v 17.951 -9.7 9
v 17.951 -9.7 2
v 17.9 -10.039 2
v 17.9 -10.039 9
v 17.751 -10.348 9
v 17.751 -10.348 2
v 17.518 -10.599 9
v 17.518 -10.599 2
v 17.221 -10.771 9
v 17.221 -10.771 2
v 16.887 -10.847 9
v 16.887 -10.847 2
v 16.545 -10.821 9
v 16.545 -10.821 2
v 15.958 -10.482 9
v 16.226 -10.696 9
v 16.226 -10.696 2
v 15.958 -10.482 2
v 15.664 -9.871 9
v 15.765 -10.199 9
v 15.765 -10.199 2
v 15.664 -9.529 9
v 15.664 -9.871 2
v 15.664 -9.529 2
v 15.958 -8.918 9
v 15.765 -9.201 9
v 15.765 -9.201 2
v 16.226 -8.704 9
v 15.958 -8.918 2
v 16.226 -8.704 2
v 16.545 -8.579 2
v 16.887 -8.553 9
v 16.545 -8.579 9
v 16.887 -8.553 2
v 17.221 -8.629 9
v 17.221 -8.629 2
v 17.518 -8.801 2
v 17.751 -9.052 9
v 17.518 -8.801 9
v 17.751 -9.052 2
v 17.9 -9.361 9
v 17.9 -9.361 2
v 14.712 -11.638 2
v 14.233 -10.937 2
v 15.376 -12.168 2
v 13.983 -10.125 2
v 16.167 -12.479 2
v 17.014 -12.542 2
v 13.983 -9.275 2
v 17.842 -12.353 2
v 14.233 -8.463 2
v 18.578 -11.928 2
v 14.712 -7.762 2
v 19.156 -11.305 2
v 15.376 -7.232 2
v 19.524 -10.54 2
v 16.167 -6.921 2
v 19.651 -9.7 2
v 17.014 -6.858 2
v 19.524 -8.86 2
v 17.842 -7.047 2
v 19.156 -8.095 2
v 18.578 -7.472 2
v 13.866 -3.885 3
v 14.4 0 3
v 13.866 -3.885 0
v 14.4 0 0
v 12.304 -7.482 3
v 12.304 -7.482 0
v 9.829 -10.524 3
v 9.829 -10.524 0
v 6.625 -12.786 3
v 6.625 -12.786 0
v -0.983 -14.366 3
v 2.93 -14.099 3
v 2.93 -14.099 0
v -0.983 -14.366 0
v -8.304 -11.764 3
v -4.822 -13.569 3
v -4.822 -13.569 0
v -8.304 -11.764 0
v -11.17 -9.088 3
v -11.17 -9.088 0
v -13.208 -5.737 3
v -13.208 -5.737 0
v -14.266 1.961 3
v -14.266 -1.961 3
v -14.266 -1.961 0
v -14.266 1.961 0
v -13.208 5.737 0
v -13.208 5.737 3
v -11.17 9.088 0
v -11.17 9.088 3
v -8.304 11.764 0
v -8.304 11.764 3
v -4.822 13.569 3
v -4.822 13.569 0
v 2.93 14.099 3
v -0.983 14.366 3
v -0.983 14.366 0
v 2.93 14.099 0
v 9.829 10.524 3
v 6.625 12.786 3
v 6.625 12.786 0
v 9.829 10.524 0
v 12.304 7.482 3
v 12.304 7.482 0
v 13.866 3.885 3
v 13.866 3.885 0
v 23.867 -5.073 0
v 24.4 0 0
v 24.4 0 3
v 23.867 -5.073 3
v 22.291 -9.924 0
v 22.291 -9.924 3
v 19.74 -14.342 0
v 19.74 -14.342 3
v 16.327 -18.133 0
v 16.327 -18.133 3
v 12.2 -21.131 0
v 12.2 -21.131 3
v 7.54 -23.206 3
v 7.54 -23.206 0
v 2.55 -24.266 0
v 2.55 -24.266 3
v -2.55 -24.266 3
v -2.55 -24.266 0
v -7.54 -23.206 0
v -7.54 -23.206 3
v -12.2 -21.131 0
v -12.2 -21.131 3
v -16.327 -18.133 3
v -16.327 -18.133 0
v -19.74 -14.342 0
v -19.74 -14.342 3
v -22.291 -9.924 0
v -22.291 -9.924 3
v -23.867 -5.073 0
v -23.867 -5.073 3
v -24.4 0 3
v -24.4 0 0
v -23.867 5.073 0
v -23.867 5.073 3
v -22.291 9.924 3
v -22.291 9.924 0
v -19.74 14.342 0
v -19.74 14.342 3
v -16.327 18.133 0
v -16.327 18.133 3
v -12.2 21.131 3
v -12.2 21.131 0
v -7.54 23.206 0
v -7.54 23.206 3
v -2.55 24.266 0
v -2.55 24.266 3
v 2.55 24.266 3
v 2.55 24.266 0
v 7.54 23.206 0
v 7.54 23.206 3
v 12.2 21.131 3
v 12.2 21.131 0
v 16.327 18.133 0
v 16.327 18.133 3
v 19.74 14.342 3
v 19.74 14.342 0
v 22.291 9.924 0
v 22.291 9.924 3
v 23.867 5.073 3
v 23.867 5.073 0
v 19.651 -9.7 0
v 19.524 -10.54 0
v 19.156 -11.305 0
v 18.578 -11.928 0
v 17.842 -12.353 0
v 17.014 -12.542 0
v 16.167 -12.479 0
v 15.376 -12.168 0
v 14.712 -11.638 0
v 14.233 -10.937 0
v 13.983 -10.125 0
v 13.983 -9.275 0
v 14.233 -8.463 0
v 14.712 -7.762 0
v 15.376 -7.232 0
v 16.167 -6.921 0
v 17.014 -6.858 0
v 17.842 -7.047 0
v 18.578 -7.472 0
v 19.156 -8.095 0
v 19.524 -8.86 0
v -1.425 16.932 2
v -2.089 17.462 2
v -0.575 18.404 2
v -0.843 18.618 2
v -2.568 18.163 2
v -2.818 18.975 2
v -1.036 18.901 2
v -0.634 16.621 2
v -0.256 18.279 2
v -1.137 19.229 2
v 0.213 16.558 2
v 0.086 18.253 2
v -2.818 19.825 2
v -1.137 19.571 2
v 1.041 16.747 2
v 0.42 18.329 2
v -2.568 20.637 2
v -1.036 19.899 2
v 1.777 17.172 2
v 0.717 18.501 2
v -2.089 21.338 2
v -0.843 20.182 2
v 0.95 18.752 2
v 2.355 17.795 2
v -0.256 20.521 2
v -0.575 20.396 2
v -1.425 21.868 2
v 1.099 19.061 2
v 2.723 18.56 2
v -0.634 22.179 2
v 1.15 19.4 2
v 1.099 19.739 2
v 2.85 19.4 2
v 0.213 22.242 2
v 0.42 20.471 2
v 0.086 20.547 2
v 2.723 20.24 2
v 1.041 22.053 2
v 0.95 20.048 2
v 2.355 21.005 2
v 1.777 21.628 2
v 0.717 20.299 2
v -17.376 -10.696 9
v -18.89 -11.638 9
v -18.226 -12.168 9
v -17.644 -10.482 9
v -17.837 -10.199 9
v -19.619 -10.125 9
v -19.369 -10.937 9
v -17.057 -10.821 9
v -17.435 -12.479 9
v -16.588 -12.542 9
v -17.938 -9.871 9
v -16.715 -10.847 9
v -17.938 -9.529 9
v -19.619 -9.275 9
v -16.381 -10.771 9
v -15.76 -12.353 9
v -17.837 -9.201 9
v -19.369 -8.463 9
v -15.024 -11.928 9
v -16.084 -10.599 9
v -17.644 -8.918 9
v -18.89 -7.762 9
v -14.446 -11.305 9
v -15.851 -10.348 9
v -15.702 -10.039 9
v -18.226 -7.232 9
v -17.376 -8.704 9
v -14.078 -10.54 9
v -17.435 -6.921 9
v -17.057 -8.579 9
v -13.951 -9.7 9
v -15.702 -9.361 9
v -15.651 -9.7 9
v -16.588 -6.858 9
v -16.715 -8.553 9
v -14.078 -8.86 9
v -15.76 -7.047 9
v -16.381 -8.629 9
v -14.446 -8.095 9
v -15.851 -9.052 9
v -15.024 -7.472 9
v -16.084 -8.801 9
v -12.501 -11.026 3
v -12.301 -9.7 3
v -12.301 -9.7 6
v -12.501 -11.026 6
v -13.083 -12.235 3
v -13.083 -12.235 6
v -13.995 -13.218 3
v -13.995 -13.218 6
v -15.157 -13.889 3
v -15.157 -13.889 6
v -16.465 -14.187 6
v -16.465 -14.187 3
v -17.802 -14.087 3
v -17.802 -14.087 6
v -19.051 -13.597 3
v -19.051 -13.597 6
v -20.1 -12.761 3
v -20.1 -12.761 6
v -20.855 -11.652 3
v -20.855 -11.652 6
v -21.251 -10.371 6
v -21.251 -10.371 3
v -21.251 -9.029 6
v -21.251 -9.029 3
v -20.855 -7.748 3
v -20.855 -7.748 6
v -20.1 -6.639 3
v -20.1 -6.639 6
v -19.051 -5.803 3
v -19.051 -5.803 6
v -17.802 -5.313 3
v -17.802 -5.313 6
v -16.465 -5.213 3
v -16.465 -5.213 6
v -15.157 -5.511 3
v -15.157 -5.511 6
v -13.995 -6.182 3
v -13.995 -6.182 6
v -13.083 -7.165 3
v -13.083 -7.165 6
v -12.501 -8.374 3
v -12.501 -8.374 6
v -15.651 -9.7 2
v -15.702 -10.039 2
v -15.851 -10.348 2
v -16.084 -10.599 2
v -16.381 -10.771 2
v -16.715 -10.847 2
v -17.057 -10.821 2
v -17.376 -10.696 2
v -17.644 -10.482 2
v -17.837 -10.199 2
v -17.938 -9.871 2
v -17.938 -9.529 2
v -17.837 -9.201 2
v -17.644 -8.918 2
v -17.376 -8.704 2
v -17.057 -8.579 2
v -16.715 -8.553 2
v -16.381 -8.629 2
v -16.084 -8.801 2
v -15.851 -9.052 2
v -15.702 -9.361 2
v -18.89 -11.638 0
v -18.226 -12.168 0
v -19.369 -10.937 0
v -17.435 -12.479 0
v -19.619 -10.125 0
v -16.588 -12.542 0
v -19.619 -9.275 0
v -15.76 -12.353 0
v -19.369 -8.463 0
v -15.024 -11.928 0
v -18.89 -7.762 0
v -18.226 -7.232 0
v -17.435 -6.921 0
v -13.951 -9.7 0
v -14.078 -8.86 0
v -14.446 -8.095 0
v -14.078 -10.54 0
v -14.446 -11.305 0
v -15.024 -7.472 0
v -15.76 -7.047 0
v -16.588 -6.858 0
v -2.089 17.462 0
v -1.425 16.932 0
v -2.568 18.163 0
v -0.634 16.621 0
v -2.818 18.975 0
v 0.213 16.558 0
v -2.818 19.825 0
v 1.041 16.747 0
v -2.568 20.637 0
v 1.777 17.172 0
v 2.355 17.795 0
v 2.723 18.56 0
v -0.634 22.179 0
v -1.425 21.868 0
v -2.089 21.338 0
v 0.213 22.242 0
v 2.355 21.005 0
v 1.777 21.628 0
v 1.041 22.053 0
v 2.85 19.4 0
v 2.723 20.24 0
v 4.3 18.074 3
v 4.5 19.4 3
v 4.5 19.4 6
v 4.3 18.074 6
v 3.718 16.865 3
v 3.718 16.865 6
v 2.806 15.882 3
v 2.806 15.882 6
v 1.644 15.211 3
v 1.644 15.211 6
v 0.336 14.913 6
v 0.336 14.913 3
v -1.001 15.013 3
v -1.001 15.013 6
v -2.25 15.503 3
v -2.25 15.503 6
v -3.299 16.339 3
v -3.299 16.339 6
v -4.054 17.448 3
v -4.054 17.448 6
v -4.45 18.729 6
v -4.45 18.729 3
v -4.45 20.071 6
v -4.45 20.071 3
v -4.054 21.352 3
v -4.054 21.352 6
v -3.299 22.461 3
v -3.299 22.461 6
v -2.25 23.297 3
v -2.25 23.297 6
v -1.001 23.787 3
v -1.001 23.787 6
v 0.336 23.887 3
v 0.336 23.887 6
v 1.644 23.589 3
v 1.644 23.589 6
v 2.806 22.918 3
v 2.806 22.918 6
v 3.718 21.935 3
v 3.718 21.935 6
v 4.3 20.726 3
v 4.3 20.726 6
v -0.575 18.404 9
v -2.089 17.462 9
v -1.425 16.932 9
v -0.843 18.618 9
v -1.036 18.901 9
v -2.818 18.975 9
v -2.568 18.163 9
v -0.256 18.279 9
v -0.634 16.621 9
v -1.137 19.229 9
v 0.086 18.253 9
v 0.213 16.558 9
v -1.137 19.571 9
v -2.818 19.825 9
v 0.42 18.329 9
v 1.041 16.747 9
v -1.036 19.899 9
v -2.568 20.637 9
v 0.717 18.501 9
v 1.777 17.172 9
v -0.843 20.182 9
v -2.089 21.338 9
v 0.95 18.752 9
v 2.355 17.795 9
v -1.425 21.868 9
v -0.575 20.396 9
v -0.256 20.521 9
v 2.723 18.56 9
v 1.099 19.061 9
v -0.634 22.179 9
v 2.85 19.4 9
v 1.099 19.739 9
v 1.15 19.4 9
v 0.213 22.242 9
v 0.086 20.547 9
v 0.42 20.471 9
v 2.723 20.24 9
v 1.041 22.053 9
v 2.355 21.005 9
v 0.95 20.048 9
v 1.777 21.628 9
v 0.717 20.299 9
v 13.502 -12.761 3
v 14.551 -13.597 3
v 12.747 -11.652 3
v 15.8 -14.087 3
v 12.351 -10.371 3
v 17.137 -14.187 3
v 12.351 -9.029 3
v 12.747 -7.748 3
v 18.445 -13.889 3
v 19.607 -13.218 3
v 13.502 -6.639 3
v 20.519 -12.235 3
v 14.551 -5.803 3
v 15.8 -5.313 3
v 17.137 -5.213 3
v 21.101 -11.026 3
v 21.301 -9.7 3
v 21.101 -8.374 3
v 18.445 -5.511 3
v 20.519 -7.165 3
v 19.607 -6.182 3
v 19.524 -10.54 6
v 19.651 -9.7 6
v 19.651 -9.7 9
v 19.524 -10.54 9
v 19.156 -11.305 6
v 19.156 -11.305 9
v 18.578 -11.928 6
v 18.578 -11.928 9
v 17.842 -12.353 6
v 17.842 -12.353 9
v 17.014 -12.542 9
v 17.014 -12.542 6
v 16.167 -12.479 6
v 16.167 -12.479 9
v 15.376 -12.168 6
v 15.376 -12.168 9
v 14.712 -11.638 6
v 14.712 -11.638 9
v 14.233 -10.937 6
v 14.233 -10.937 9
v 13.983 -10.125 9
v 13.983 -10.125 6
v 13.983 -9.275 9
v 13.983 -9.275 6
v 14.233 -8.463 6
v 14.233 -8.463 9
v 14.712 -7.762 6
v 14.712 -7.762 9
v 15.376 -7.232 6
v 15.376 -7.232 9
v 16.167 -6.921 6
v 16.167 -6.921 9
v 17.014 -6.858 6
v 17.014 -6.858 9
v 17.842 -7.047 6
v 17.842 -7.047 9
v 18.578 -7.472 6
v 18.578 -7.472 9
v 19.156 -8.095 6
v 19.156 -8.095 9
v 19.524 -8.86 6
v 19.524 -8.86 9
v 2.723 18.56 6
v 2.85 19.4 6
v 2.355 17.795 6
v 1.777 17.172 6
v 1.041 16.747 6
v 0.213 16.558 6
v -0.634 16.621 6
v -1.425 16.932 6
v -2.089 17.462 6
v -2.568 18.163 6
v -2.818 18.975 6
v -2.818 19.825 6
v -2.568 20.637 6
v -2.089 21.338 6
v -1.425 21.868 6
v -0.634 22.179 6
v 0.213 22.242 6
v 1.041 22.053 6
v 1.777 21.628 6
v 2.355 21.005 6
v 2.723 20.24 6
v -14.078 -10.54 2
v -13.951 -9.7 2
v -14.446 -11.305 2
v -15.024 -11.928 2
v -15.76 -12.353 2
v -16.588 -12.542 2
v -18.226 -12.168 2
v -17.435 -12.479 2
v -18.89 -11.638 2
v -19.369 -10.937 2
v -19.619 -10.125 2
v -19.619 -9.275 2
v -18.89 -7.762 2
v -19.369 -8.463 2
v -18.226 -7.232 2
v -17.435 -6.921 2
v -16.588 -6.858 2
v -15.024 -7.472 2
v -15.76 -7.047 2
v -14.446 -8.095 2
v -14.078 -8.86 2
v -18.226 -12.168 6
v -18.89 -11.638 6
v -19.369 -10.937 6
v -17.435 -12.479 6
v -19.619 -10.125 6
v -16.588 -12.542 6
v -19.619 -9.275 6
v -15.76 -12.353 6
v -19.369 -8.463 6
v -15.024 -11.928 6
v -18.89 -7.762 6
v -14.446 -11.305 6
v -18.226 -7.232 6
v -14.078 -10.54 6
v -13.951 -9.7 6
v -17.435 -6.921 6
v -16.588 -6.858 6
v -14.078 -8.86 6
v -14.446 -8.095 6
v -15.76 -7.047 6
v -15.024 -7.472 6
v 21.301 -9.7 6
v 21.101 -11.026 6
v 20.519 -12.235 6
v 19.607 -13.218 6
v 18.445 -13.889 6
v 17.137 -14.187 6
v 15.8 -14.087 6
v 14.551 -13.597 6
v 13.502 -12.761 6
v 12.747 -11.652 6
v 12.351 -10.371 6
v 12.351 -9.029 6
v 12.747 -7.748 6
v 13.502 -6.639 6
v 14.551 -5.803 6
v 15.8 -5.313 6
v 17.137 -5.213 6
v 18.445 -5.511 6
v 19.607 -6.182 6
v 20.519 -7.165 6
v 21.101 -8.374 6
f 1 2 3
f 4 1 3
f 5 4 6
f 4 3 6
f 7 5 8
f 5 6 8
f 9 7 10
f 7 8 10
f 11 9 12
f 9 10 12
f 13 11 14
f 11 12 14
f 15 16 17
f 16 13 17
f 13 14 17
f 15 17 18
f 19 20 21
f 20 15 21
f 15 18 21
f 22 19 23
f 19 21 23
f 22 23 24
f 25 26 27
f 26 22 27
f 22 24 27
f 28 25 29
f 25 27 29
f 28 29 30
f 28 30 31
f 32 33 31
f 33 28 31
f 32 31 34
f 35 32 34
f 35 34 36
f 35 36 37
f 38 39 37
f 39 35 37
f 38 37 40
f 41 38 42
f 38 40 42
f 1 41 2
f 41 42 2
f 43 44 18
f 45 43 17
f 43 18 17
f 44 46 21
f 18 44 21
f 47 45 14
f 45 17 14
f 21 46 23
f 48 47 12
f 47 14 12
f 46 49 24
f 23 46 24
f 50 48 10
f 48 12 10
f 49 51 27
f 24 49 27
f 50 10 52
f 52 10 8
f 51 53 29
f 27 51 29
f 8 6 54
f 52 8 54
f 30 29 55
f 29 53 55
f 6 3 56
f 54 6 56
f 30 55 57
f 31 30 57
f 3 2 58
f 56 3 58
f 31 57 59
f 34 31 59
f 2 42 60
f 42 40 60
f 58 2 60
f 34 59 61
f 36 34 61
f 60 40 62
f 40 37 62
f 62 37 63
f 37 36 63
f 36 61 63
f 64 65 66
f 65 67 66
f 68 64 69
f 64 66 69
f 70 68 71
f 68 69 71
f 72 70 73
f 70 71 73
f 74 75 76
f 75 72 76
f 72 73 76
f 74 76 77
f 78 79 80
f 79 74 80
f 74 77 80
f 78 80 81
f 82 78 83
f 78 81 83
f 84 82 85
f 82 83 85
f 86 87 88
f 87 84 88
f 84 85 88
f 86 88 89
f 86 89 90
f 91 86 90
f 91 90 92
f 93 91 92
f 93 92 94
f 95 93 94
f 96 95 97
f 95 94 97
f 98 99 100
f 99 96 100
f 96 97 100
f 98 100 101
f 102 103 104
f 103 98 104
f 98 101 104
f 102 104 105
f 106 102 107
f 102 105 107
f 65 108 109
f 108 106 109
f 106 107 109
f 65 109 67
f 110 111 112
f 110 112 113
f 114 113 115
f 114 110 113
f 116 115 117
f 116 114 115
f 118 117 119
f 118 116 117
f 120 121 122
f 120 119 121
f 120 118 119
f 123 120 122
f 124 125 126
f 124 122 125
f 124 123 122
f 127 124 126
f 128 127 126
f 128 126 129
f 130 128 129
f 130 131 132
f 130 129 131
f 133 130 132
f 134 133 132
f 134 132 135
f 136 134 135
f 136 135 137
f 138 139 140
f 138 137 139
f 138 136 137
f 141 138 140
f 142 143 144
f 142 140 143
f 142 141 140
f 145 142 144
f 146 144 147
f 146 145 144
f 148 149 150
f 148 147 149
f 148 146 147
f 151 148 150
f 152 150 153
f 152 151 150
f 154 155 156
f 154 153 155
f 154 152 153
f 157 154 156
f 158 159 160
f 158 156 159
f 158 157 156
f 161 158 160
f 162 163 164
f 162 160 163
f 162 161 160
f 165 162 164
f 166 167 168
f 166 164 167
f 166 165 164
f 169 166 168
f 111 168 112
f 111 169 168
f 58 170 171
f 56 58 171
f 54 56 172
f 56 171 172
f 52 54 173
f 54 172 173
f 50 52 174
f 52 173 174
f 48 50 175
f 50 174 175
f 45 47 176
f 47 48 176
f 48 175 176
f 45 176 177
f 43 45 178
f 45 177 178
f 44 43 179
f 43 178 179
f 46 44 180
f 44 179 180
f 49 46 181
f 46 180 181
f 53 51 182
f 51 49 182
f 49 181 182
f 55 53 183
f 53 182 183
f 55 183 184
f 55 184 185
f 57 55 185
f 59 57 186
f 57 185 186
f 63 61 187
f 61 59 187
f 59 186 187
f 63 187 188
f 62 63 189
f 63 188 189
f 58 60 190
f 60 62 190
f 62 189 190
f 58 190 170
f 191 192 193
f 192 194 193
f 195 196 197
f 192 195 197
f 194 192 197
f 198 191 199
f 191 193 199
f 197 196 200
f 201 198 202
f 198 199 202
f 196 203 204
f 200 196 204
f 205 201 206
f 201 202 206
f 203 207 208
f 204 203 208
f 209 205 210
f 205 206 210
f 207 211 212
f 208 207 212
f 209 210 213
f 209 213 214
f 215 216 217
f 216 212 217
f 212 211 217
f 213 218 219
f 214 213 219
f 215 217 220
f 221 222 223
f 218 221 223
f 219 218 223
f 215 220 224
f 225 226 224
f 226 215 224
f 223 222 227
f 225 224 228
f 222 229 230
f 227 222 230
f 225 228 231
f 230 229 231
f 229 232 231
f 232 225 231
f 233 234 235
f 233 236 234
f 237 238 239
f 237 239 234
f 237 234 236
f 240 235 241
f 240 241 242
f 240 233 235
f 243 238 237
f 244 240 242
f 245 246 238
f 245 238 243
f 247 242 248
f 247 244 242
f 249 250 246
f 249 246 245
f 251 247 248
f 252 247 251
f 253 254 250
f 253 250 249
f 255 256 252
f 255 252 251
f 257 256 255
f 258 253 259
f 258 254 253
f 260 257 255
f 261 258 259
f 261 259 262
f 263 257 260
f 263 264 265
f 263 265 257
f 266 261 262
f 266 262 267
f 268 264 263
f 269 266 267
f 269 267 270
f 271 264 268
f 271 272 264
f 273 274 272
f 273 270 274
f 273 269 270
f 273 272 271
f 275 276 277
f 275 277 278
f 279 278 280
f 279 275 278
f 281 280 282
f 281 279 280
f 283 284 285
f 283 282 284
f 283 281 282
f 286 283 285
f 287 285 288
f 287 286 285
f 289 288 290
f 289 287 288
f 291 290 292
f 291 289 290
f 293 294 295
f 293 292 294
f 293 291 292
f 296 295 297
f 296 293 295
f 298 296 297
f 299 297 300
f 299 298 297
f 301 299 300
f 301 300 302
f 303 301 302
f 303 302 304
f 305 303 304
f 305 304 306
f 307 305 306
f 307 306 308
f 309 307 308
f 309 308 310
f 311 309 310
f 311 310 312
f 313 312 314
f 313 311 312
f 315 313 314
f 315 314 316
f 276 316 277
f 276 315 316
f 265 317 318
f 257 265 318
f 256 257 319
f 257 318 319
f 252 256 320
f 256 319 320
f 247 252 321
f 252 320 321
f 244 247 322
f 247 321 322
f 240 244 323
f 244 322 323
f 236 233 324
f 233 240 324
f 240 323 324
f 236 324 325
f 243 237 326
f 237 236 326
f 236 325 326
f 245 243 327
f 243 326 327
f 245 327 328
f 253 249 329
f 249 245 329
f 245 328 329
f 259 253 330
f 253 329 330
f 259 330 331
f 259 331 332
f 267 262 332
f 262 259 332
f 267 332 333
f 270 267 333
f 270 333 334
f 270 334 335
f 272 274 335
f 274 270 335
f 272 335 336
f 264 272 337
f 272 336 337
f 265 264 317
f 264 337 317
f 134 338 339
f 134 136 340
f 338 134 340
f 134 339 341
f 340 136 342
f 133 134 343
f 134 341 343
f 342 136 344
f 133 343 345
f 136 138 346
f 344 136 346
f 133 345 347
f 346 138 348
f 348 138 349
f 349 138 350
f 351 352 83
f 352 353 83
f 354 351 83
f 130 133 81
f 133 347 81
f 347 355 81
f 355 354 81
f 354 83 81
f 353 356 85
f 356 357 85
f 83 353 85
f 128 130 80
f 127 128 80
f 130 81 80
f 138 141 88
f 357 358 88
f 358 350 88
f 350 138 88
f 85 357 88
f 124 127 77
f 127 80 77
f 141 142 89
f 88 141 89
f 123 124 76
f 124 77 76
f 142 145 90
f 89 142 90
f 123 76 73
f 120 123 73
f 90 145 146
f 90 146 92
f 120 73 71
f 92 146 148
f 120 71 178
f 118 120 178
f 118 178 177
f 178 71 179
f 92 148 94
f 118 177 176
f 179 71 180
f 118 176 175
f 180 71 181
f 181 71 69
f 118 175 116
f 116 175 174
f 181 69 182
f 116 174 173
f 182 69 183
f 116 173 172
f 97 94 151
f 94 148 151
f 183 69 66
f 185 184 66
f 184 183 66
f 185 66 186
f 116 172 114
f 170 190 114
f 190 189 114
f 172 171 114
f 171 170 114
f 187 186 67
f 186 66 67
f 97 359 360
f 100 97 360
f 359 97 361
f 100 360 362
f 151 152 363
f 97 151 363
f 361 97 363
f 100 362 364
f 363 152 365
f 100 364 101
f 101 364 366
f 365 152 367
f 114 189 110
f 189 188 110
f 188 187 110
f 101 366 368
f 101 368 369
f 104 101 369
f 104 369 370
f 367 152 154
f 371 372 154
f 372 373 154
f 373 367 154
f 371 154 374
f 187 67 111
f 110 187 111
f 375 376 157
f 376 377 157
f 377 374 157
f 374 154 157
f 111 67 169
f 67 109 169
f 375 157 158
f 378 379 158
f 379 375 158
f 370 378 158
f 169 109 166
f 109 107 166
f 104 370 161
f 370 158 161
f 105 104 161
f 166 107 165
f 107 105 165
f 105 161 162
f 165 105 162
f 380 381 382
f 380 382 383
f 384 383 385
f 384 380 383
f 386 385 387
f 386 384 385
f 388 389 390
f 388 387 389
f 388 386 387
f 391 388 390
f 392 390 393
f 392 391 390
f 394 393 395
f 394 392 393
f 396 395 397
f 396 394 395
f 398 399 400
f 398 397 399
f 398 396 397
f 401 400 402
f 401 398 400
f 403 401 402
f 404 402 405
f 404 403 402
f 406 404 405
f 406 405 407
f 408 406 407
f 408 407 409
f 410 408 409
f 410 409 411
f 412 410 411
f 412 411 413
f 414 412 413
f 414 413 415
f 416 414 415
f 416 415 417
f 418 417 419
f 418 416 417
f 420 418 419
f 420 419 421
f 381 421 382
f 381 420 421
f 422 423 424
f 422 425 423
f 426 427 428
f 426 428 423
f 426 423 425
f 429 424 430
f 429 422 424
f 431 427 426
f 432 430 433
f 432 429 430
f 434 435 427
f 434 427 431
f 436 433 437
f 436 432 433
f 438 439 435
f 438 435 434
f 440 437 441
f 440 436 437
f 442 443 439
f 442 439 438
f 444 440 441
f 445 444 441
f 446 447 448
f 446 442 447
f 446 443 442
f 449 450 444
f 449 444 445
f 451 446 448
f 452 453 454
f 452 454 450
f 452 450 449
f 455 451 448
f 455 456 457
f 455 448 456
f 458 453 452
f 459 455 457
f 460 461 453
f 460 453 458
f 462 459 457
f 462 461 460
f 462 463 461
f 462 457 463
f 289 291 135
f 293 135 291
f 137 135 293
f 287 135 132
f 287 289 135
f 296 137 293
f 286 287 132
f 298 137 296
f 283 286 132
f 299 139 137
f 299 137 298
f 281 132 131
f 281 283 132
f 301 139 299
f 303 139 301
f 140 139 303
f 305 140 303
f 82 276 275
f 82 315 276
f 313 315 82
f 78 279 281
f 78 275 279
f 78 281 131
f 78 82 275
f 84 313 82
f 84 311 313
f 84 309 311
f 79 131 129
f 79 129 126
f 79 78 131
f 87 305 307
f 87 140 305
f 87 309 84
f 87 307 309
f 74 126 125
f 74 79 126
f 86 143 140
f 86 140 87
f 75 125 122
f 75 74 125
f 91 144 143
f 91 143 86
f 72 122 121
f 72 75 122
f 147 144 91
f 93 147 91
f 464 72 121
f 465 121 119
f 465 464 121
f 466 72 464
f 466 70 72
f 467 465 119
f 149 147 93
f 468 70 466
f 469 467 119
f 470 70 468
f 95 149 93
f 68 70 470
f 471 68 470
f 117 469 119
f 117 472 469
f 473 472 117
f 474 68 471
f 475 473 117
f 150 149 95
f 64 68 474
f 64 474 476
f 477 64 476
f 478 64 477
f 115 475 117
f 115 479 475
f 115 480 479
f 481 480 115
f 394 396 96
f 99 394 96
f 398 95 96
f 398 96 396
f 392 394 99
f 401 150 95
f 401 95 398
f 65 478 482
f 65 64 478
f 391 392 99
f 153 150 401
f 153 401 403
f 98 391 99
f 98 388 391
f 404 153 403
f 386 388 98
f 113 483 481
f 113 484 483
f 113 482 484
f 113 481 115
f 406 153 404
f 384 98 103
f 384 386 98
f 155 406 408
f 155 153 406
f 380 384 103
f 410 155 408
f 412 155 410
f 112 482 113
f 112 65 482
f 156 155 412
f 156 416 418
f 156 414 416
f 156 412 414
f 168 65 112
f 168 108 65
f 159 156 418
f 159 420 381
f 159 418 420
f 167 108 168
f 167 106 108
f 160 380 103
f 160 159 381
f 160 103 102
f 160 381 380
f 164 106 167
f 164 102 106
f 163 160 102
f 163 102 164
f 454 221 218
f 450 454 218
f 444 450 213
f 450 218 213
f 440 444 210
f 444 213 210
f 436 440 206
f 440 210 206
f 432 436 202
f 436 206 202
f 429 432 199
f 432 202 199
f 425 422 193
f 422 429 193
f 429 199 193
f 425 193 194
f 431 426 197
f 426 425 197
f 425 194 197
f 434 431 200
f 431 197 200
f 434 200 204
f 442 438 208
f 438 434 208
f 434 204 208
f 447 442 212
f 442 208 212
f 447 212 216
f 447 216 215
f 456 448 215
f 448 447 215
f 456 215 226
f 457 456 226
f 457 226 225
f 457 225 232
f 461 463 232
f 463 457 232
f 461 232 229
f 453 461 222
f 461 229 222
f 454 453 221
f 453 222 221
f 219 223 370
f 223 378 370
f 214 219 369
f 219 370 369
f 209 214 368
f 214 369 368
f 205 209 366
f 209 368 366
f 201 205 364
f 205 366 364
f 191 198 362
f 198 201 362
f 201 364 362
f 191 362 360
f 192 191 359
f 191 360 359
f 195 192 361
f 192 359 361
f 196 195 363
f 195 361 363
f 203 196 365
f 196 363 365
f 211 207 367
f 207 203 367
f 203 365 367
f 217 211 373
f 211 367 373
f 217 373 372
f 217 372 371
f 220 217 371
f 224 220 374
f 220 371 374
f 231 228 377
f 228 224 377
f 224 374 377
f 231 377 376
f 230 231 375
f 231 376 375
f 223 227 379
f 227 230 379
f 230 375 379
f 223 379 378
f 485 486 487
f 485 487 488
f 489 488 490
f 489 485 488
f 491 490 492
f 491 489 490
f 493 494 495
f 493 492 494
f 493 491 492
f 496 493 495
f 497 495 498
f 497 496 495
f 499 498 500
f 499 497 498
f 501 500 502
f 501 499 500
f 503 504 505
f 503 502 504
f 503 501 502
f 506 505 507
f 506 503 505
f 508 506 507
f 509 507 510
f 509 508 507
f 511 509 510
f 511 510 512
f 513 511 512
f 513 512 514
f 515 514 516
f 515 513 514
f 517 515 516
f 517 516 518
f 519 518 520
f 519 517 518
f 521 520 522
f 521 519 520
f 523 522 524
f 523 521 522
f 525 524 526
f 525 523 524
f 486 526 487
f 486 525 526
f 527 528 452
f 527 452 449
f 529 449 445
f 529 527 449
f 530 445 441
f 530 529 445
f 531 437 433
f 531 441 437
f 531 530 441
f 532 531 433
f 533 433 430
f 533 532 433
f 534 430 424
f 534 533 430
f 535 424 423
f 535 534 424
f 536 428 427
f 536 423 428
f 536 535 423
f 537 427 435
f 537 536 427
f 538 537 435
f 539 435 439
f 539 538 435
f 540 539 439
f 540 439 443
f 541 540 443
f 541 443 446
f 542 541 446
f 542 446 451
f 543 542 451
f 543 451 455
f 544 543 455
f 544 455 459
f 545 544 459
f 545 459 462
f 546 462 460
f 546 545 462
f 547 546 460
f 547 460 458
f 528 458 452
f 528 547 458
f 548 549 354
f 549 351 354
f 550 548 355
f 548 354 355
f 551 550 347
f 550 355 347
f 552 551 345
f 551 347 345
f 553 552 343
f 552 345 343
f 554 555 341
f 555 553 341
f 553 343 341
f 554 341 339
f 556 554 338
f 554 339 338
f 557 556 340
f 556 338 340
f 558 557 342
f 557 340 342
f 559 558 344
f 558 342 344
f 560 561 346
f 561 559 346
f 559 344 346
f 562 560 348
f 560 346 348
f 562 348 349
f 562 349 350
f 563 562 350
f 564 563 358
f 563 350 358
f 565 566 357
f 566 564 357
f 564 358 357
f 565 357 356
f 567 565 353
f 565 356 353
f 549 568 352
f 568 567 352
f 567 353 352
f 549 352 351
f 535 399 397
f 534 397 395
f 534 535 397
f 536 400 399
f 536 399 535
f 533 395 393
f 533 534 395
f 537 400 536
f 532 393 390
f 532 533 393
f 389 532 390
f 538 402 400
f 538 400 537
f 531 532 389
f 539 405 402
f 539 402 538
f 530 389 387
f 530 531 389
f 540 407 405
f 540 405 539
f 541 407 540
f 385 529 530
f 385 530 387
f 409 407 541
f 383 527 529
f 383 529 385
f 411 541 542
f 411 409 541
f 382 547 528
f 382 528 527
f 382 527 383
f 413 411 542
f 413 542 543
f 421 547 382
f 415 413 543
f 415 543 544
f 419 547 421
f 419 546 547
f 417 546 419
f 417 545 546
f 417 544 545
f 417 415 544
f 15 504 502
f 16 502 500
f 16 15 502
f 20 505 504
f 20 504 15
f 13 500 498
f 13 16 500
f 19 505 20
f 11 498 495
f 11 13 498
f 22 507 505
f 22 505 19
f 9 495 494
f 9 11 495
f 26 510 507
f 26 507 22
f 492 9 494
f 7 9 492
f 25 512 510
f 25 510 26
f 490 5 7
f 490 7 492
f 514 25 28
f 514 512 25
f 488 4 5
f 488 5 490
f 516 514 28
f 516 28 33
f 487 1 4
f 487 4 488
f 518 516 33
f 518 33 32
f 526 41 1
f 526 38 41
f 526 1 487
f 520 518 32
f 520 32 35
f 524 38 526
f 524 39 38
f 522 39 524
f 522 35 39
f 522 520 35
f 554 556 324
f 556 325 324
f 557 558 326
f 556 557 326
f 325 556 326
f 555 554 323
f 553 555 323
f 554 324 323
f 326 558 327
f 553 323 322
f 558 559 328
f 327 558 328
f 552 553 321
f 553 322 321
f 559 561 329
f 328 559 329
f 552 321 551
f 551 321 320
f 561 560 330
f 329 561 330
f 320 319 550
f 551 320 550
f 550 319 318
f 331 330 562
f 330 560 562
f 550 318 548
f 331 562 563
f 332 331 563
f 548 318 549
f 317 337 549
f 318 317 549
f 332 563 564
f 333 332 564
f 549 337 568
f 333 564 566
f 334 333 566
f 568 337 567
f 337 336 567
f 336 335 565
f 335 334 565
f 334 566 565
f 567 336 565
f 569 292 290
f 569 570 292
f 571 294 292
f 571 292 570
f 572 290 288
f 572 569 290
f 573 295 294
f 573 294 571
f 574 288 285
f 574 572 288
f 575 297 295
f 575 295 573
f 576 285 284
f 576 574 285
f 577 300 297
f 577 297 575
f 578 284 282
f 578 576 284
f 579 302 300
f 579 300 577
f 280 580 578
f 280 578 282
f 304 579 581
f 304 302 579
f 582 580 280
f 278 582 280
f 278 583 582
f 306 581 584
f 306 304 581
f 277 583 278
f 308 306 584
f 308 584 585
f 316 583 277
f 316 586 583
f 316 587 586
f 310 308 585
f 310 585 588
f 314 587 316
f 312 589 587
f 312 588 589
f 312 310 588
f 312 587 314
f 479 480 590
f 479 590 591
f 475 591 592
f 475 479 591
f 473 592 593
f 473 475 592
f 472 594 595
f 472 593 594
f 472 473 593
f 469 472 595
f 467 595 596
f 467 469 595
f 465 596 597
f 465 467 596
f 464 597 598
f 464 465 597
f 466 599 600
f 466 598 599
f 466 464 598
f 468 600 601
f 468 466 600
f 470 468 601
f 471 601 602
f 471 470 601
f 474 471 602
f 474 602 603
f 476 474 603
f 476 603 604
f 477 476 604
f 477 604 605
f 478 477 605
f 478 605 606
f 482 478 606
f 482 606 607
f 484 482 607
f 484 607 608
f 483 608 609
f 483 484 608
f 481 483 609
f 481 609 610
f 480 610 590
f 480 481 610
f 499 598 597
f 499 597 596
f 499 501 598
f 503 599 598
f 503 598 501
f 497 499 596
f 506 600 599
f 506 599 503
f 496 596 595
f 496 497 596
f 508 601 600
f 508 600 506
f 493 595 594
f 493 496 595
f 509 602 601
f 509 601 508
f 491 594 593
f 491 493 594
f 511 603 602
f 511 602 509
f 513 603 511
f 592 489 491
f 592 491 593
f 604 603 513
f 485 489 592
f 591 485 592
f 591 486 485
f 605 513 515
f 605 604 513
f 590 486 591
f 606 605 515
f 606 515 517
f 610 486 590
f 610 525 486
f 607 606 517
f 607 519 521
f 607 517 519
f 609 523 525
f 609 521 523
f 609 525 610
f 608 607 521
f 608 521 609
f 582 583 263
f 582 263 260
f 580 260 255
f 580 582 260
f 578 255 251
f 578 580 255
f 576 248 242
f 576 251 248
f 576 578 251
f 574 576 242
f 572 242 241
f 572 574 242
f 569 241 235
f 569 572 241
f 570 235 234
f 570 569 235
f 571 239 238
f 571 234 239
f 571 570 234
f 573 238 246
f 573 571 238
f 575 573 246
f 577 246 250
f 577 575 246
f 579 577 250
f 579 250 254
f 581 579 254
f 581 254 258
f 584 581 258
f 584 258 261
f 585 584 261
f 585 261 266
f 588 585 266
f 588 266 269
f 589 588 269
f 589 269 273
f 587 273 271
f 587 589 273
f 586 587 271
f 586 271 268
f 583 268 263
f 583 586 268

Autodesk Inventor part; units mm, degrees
ref_plane "YZ Plane" through (0, 0, 0) normal (1, 0, 0) x (0, 1, 0)
ref_plane "XZ Plane" through (0, 0, 0) normal (0, 1, 0) x (-1, 0, 0)
ref_plane "XY Plane" through (0, 0, 0) normal (0, 0, 1) x (1, 0, 0)
sketch "Skizze1" plane through (0, 0, 0) normal (0, 0, 1) x (1, 0, 0)
  line L0 (-34.16, 0) -> (34.16, 0) construction
  circle A0 centre (0, 0) radius 19.4 construction
  circle A1 centre (0, 19.4) radius 1.15
  circle A2 centre (16.8009, -9.7) radius 1.15
  circle A3 centre (-16.8009, -9.7) radius 1.15
  line L1 (0, 34.16) -> (0, -34.16) construction
  line L2 (0, 0) -> (-16.8009, -9.7) construction
  circle A4 centre (0, 0) radius 14.4
  circle A5 centre (0, 0) radius 24.4
  circle A6 centre (16.8009, -9.7) radius 2.85
  circle A7 centre (0, 19.4) radius 2.85
  circle A8 centre (-16.8009, -9.7) radius 2.85
  circle A9 centre (0, 19.4) radius 4.5
  circle A10 centre (16.8009, -9.7) radius 4.5
  circle A11 centre (-16.8009, -9.7) radius 4.5
  dimension "d0" = 38.8
  dimension "d1" = 2.3
  dimension "d2" = 30
  dimension "d3" = 5
  dimension "d4" = 5
  dimension "d21" = 5.7
  dimension "d27" = 9
extrude "Extrusion2" add sketch "Skizze1" along normal blind 3 contours A5 | A6 | A7 | A8 | A9 | A10 | A11
extrude "Extrusion4" add sketch "Skizze1" along normal blind 3 from surface at 3 contours A6 | A7 | A8 | A9 | A10 | A11
extrude "Extrusion5" add sketch "Skizze1" along normal blind 3 from surface at 6 contours A6 | A7 | A8
extrude "Extrusion6" cut sketch "Skizze1" along normal blind 2 contours A6 | A7 | A8
equation "\"d3\" = d4"
properties part number "PlanetaryHolderBottom"
